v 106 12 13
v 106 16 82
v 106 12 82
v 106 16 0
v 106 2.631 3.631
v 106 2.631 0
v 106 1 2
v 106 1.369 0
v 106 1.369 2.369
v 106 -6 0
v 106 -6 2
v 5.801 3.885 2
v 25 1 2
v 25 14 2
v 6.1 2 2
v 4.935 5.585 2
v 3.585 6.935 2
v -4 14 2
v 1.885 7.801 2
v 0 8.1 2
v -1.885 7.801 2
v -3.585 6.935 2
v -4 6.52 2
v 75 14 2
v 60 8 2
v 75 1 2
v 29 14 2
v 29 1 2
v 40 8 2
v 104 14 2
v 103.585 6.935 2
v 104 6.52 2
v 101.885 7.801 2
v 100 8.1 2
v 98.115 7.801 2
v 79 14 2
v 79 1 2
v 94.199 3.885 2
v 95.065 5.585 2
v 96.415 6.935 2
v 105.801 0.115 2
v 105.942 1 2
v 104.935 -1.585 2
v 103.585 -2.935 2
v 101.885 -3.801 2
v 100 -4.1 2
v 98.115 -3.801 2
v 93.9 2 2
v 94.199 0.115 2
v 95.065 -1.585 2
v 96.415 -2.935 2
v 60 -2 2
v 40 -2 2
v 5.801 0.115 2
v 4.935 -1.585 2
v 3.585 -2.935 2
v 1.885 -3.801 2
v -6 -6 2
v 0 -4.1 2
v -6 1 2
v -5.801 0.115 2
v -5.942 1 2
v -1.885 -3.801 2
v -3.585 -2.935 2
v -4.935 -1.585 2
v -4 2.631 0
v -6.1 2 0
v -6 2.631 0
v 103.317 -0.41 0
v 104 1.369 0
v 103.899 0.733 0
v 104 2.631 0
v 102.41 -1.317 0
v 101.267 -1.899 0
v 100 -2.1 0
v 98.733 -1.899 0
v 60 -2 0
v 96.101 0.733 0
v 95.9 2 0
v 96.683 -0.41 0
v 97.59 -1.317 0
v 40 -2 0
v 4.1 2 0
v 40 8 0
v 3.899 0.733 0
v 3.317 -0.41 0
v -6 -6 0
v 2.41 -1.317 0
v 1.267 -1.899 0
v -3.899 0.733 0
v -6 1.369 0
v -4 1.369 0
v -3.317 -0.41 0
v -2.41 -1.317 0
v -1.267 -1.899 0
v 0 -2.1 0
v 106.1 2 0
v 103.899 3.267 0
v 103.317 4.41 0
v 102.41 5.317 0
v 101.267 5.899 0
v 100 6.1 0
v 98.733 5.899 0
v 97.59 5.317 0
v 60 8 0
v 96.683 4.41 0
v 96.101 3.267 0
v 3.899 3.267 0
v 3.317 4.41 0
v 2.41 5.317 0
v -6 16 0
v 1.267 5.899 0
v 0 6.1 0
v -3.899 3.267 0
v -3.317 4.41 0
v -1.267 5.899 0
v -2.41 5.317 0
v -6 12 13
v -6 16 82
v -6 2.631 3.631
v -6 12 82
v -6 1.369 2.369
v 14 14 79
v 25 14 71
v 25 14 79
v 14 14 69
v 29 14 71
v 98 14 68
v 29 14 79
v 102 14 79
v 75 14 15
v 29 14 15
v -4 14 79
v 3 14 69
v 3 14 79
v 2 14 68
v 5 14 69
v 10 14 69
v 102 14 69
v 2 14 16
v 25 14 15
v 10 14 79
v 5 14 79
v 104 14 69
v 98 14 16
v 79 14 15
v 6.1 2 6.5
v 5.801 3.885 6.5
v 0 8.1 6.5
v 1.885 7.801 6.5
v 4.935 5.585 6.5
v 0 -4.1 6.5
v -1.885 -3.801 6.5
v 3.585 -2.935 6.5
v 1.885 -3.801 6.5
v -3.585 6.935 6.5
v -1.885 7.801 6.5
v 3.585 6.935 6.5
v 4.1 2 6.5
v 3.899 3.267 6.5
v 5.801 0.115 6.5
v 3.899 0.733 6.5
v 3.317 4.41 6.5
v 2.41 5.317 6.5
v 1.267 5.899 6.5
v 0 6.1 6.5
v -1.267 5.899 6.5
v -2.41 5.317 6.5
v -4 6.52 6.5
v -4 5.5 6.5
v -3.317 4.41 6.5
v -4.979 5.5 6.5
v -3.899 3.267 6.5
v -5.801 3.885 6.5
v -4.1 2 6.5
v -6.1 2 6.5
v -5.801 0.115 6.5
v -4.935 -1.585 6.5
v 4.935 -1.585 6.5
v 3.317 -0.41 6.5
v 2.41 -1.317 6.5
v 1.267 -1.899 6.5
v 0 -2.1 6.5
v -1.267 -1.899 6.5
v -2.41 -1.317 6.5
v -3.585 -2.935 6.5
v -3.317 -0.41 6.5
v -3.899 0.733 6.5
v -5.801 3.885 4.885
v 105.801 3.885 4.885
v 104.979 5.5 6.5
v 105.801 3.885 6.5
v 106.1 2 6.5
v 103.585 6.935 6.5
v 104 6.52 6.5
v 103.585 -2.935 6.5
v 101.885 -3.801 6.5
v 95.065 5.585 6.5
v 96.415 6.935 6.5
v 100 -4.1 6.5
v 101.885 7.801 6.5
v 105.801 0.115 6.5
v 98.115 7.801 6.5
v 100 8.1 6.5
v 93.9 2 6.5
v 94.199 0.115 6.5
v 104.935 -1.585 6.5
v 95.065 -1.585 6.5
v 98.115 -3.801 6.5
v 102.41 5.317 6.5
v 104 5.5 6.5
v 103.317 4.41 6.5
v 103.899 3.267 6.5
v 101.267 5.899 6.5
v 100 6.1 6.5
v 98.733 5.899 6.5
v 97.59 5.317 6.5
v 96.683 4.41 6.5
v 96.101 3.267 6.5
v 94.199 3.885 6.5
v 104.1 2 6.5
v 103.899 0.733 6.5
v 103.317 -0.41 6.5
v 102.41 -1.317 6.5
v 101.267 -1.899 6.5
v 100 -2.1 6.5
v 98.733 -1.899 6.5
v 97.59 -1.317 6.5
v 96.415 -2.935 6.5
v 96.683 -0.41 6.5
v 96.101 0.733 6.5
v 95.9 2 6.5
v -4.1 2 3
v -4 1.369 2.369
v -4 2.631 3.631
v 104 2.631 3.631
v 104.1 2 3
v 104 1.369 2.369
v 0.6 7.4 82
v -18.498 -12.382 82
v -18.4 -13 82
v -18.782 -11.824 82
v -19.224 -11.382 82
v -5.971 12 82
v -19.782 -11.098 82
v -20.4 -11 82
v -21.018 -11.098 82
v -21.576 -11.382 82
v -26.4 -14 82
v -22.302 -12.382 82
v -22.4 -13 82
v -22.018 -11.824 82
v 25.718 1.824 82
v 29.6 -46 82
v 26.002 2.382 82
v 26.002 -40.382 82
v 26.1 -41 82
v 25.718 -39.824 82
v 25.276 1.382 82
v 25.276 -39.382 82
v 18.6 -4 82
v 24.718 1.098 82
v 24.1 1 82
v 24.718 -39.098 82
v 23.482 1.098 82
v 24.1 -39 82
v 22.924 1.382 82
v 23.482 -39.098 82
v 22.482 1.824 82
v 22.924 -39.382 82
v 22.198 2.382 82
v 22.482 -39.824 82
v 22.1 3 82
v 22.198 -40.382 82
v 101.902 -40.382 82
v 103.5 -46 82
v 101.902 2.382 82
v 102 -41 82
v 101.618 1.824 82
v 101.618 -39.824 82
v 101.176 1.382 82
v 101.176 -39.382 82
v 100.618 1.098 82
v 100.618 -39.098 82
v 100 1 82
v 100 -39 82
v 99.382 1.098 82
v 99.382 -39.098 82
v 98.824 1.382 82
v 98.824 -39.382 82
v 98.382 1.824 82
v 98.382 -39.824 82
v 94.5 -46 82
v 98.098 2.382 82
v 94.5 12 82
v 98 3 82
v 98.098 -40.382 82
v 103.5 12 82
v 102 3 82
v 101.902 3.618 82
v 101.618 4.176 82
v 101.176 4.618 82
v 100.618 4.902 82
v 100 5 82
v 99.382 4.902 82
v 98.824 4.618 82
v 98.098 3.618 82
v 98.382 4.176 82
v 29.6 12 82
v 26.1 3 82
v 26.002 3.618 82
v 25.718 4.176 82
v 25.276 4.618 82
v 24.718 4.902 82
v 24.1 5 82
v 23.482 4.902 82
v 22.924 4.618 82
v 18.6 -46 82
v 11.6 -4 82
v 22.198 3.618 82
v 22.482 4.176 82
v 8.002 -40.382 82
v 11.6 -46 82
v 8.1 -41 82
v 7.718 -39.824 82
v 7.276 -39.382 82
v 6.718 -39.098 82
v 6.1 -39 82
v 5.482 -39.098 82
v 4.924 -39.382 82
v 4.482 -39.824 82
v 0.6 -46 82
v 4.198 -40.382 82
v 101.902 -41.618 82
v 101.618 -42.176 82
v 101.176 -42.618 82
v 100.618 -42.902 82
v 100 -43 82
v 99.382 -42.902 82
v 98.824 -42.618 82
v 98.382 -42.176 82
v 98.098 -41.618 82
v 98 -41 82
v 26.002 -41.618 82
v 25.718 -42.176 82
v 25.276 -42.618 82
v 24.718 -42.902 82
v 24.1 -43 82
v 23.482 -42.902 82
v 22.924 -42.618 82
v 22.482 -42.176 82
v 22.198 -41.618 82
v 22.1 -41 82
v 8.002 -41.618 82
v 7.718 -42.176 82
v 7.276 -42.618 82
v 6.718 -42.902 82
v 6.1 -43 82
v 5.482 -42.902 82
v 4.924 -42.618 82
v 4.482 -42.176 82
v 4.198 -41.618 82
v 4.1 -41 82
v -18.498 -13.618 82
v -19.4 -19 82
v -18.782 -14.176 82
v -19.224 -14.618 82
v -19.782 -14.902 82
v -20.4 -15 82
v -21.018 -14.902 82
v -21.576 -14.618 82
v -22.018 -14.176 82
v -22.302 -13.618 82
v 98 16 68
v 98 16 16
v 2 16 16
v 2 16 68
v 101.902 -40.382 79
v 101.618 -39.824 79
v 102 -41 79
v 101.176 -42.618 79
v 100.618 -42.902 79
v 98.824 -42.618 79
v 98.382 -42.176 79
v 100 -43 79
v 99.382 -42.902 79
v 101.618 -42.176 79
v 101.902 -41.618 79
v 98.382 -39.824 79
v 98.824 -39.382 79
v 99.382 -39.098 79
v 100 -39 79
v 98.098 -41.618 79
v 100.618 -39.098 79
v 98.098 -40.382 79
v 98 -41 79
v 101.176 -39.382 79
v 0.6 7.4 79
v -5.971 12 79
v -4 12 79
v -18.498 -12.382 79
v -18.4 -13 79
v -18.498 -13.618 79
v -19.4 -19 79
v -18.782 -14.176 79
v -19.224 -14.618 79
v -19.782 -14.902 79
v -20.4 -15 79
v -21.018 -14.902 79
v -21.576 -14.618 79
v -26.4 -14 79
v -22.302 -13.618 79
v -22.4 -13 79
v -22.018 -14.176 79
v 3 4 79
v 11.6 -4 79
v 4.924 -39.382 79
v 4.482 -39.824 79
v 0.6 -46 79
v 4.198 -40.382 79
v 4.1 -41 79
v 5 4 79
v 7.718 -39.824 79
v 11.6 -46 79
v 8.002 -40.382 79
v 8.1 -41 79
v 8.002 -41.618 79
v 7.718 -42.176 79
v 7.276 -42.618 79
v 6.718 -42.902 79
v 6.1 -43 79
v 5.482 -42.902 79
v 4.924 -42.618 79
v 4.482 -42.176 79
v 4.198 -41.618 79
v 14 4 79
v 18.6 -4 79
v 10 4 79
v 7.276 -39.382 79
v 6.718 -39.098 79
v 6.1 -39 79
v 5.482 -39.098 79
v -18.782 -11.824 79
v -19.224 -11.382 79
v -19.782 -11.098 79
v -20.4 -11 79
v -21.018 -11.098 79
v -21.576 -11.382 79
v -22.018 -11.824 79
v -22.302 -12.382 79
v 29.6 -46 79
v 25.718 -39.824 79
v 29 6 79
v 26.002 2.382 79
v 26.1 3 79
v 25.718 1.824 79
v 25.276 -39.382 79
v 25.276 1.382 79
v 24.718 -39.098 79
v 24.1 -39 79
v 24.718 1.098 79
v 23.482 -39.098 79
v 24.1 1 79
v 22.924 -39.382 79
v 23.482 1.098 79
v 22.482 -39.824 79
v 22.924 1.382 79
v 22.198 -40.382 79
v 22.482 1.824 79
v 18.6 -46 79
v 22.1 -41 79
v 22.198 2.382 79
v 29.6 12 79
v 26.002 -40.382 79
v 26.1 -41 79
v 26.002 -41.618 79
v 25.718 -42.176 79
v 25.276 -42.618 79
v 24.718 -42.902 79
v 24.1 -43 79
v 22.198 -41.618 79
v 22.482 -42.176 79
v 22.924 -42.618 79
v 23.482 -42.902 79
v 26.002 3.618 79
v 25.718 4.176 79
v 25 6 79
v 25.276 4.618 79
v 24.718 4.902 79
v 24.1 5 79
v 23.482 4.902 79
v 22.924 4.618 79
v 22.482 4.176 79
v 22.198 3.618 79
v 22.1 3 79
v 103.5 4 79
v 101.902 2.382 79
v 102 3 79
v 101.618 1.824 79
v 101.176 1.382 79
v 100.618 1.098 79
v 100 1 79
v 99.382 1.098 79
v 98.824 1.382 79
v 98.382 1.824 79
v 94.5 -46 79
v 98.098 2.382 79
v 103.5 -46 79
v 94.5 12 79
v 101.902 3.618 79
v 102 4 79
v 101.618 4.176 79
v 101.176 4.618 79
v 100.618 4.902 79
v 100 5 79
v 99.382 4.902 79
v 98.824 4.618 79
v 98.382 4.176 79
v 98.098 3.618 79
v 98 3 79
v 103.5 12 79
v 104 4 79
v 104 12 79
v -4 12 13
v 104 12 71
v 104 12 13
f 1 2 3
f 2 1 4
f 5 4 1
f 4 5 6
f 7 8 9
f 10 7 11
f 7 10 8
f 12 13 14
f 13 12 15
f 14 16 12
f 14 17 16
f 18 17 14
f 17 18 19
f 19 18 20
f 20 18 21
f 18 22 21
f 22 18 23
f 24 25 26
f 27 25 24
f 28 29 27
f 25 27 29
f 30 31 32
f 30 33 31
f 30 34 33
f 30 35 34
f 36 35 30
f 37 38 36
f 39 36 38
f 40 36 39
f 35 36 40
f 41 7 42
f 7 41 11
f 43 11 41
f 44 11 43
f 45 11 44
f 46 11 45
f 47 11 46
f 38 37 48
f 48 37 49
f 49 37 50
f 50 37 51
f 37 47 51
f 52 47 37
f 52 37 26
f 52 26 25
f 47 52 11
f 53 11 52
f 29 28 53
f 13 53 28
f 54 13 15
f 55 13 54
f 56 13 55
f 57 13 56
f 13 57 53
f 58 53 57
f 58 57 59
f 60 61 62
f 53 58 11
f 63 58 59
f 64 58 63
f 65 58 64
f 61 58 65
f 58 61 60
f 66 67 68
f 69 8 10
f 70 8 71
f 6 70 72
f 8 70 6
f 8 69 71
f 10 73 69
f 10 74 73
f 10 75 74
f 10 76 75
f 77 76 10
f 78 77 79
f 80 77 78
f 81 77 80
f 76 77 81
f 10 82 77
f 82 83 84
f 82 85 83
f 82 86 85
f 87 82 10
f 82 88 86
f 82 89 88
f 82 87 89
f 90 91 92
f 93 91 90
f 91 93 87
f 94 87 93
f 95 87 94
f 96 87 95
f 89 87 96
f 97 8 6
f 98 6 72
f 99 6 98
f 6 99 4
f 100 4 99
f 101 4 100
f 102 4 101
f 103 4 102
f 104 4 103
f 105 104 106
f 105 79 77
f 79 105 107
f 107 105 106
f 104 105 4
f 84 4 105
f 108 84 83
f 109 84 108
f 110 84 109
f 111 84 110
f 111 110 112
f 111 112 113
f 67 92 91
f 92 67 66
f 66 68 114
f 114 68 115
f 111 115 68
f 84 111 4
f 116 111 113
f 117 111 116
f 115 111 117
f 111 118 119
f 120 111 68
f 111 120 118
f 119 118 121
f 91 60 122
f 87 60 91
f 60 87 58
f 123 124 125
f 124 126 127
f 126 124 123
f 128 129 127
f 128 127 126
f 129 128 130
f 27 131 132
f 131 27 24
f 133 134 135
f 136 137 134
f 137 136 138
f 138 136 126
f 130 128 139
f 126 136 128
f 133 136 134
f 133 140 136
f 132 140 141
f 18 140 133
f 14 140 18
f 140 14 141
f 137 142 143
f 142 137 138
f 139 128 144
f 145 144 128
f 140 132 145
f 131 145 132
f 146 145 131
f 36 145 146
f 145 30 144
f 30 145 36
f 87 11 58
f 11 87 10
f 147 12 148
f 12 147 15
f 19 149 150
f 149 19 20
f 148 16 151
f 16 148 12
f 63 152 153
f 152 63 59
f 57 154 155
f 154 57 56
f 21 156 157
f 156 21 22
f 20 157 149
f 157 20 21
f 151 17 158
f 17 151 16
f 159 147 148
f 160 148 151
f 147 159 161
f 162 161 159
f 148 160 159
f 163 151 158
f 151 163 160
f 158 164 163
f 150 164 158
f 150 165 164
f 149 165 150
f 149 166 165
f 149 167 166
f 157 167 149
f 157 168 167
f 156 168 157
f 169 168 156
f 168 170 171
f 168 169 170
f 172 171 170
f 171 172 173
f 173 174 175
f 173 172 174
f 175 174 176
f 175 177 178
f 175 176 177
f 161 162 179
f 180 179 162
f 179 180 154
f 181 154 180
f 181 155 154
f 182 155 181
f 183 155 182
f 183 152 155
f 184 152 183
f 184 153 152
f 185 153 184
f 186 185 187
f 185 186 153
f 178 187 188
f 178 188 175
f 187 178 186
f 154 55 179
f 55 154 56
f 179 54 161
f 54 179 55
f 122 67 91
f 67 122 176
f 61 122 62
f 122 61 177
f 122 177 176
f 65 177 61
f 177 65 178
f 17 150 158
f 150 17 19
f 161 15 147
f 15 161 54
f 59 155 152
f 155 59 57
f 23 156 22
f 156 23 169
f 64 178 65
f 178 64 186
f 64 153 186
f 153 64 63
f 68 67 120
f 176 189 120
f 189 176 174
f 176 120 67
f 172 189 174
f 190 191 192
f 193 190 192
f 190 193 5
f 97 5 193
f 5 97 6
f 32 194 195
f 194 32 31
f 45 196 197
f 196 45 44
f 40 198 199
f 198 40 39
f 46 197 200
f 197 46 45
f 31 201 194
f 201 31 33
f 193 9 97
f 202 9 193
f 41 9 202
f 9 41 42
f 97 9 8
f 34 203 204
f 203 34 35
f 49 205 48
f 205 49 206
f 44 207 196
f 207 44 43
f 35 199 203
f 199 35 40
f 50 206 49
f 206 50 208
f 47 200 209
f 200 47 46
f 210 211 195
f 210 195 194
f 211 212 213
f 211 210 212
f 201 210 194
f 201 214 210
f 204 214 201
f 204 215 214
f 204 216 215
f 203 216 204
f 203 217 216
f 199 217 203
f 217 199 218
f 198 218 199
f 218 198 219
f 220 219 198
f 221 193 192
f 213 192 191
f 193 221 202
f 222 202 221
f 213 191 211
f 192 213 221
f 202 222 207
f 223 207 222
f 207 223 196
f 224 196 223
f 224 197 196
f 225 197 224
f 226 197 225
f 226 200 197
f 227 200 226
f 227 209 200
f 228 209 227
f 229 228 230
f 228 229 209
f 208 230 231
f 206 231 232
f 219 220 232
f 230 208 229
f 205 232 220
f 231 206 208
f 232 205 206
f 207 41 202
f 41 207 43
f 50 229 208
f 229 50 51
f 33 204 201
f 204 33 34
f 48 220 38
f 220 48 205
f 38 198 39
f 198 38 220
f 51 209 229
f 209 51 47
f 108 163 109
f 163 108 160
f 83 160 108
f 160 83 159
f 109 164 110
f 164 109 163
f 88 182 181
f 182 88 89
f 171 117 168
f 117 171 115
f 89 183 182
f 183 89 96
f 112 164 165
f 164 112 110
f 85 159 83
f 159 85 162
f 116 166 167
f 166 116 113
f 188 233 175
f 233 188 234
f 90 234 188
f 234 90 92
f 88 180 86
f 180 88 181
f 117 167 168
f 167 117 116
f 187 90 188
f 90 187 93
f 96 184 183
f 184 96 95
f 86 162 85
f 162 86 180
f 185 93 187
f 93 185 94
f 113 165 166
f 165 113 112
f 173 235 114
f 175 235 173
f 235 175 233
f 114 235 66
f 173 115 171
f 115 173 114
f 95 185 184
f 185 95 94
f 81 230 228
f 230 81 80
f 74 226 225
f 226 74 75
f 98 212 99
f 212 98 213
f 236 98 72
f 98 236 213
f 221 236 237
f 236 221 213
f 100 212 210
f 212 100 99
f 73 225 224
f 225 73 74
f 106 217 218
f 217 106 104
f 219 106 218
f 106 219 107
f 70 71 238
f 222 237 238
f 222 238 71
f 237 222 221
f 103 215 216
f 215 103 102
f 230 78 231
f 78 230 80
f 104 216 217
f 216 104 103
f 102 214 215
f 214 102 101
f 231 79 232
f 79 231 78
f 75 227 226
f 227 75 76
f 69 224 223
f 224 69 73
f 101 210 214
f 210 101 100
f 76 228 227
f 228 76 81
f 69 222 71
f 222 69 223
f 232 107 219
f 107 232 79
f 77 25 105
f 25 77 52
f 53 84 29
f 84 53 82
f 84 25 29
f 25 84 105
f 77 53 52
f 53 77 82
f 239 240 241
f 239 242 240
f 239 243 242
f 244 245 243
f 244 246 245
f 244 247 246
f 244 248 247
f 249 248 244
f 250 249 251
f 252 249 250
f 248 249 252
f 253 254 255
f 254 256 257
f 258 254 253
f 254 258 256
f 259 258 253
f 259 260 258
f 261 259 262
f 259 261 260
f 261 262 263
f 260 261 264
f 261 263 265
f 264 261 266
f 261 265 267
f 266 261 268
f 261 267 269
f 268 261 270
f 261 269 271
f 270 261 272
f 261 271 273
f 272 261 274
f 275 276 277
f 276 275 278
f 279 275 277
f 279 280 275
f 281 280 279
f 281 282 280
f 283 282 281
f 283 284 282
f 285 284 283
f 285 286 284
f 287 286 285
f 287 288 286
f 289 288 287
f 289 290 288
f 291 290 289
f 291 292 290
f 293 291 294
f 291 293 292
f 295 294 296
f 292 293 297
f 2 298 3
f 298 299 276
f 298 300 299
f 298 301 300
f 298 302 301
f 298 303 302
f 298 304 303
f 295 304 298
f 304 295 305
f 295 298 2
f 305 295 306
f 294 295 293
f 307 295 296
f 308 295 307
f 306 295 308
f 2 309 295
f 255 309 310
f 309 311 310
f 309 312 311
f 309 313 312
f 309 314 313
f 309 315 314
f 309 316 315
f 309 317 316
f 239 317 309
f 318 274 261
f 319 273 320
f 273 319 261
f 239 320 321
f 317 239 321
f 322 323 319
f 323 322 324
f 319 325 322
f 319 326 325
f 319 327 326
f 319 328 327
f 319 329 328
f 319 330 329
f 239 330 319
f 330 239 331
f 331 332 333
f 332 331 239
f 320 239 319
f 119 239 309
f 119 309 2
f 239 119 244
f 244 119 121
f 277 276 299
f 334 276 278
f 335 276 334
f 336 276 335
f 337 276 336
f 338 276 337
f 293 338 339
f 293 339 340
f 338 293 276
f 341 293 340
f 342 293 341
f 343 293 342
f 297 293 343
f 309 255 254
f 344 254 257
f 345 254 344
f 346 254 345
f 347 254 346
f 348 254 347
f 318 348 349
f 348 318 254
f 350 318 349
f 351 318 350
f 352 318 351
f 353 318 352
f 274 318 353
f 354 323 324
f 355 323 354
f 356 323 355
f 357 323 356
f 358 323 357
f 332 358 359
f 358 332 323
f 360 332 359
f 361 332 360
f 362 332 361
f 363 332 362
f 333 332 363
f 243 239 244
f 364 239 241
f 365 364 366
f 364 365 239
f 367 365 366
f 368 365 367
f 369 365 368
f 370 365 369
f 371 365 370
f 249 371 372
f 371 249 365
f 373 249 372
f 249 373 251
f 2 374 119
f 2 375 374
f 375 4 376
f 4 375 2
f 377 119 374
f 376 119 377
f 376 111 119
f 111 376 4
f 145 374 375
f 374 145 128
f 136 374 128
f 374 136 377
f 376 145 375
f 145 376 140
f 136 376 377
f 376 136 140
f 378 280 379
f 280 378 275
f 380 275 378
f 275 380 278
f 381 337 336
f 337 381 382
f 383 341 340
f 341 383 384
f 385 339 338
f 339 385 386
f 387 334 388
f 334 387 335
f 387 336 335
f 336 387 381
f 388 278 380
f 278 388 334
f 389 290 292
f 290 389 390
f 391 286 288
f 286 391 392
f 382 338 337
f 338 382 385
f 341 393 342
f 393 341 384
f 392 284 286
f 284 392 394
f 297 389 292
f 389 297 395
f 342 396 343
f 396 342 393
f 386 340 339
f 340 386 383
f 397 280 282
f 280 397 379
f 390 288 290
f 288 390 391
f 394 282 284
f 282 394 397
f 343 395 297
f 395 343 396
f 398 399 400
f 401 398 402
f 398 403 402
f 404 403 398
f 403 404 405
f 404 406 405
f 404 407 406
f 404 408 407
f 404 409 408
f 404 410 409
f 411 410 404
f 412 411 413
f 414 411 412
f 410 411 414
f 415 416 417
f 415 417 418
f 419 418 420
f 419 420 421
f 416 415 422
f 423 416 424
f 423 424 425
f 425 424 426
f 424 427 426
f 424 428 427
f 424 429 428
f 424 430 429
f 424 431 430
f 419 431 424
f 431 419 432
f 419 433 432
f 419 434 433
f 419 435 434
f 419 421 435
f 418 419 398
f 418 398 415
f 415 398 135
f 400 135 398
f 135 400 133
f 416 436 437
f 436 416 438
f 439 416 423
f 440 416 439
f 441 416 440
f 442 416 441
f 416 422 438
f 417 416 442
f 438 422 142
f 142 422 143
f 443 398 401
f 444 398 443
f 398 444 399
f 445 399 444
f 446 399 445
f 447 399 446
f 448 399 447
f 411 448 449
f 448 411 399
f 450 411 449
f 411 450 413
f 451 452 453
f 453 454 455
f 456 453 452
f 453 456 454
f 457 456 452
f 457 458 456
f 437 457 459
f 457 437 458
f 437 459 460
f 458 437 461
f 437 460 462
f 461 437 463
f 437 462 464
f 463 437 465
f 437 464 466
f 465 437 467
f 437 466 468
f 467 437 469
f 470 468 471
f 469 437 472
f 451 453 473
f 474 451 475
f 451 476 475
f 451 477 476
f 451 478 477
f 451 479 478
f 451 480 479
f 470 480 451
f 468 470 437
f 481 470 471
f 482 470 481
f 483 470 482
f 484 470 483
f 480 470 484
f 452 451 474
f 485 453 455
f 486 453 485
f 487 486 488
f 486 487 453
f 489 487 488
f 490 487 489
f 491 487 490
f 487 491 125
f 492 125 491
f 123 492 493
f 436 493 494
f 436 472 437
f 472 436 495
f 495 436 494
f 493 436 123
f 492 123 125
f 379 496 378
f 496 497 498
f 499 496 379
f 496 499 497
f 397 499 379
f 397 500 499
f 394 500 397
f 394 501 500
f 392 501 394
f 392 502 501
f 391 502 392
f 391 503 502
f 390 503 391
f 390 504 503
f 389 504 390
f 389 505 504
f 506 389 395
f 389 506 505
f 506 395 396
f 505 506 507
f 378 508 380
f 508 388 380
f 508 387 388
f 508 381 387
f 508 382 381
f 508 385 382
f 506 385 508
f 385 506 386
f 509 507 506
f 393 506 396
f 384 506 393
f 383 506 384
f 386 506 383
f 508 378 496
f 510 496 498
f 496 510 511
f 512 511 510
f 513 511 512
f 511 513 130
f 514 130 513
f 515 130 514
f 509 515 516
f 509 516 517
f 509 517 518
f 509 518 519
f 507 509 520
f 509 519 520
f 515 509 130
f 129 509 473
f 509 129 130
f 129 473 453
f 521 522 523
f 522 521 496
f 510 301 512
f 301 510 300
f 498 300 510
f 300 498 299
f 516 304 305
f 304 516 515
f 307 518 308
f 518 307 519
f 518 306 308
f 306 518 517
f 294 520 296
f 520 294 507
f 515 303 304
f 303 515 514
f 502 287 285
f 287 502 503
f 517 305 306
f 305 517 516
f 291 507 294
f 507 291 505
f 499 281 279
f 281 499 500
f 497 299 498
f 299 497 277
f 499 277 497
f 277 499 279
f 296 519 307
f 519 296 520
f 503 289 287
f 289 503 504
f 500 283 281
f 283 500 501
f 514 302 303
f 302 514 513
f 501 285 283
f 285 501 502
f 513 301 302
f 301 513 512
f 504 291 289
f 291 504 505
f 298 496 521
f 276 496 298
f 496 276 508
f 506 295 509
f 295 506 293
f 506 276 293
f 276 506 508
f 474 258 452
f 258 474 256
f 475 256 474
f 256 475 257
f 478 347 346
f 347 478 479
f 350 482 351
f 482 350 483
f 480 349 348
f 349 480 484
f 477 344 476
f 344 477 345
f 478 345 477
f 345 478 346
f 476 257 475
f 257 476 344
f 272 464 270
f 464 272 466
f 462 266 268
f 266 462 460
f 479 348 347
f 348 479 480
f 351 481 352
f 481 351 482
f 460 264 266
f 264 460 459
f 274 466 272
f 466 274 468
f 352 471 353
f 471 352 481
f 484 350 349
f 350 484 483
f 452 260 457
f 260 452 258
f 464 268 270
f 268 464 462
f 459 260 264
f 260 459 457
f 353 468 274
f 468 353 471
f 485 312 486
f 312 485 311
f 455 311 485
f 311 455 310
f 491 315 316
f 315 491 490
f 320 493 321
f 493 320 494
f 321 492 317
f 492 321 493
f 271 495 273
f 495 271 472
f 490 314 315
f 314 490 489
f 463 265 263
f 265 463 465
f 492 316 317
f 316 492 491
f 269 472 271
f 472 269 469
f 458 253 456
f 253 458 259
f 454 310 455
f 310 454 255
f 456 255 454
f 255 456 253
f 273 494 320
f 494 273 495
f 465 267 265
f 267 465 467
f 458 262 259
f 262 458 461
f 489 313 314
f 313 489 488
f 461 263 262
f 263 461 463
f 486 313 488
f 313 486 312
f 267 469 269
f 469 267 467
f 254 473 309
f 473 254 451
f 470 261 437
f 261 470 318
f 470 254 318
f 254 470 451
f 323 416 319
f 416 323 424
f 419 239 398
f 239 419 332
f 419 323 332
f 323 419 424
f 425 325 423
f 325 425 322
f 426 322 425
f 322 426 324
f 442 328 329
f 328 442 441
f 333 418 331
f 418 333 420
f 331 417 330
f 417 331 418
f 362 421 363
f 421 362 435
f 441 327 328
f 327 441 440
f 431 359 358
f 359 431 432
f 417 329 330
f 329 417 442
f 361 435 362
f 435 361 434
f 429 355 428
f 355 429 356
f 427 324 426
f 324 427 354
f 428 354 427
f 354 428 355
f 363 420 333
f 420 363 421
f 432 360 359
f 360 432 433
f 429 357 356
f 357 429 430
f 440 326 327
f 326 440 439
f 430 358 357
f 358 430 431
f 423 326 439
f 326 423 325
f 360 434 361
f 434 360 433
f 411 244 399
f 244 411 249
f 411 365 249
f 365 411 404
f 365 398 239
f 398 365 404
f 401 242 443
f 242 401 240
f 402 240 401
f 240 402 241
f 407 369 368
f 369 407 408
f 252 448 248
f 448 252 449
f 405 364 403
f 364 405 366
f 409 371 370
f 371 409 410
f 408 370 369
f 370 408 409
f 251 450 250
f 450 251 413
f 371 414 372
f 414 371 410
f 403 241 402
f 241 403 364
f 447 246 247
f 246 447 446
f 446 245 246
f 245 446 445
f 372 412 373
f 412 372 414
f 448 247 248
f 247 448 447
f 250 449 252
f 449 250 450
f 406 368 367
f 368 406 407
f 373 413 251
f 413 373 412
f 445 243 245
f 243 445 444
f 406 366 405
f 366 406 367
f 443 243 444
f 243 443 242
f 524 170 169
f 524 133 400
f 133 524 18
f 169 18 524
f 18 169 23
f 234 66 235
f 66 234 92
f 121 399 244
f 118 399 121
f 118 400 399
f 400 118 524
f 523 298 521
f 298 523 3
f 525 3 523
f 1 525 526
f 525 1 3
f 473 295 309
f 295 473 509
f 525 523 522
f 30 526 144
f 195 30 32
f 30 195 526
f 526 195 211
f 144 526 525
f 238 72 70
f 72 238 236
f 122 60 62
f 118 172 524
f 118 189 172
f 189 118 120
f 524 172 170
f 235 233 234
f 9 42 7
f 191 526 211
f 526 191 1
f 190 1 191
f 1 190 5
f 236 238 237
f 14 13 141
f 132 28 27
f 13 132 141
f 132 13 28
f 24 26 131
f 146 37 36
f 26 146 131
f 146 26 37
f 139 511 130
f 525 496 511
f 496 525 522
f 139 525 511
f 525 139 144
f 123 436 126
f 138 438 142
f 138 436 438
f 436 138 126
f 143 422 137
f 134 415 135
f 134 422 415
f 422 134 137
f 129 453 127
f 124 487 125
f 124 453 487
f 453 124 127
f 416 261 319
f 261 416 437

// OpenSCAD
//translate([-5,2,5])
//rotate([90,0,0])
//scale([1.06,1.06,1.06])
//import("din_rail_mount.stl");
$fn=20;
//lcd
lcd_hole_pitch_w = 75.9;
lcd_hole_pitch_l = 44;


mount_hole_w = 100;
mount_hole_d = 8.2;

rfid_hole_w = 42;
rfid_hole_d = 4;

mount_h = 2;
mount_l = 20;


full_h = 46 + 47; //box depth + lid depth
lcd_h = 5;
lcd_mount_h = 6; //6mm stand off (8mm for rdif as thinner)
arm_t = 3; //thickness of arms holding lcd and rfif
arm_l = 11;

stand_off_h = full_h - lcd_h - lcd_mount_h; //how tall it needs to be
stand_off_hp = full_h - lcd_h - lcd_mount_h-arm_t; //base of arm hieght


//basemountframe
difference(){
    union(){
        translate([-6,-6,0])
            cube([mount_hole_w+12,mount_l,mount_h]);
        translate([0,2,0])
        cylinder(h=6.5, d =mount_hole_d+4);
        
        translate([mount_hole_w,2,0])
            cylinder(h=6.5, d =mount_hole_d+4);
        
    }
    translate([0,2,0])
    cylinder(h=6.5, d =mount_hole_d);
    translate([mount_hole_w,2,0])
        cylinder(h=6.5, d =mount_hole_d);
    translate([mount_hole_w/2-10,-2,0])
        cube([20,10,mount_h]);   //screw mount is in the way
}

//upright bit
translate([-6,14,0])
difference(){
    cube([mount_hole_w+12,2,stand_off_h]);
    translate([8,0,16])
    cube([mount_hole_w-4,2,stand_off_h-30]);
}
//support
translate([-6,12,0])
cube([2,2,stand_off_h]);
translate([mount_hole_w +6-2,12,0])
cube([2,2,stand_off_h]);
#translate([-6,12,stand_off_hp])
cube([mount_hole_w+12,2,3]);


//arms to hold lcd and rfid
//rightmost arm
color("blue")
translate([mount_hole_w-arm_l/2,14-60,stand_off_hp])
difference(){
    cube([arm_l-2,60,arm_t]);
    translate([0,5,0]){
        translate([arm_l/2,0,0])
            #cylinder(h=6, d =rfid_hole_d);
        translate([arm_l/2,lcd_hole_pitch_l,0])
            #cylinder(h=6, d =rfid_hole_d);
    }
}
//left arm for lcd
color("blue")
translate([mount_hole_w-arm_l/2-lcd_hole_pitch_w,14-60,stand_off_hp])
difference(){
    cube([arm_l,60,arm_t]);
    translate([0,5,0]){
        translate([arm_l/2,0,0])
            #cylinder(h=6, d =rfid_hole_d);
        translate([arm_l/2,lcd_hole_pitch_l,0])
            #cylinder(h=6, d =rfid_hole_d);
    }
}

//rfid right arm
color("blue")
translate([mount_hole_w-arm_l/2-lcd_hole_pitch_w-18,14-60,stand_off_hp])
difference(){
    cube([arm_l,60,arm_t]);
    translate([0,5,0]){
        translate([arm_l/2,0,0])
            #cylinder(h=6, d =rfid_hole_d);
    }
}

//rfid left arm
color("blue")
translate([mount_hole_w-arm_l/2-lcd_hole_pitch_w-18-25+4,14,stand_off_hp])
difference(){
    translate([26,0,0])
    rotate([0,0,180])
    linear_extrude(arm_t)
    polygon([[0,0],[25,33],[32,28],[10,0]]);
    
    #translate([0,-(60-2-31),0])
        cylinder(h=6, d =rfid_hole_d);
    
    
}

module angle_supp(siz=5, wid=2) {
    rotate([0,-90,180])
    linear_extrude(wid)
    polygon([[0,0],[siz,0],[0,siz]]);
    
}
//supports
translate([-6,14,0])
angle_supp(15);

translate([mount_hole_w+4,14,0])
angle_supp(15);

translate([25,14,0])
angle_supp(15, 4);

translate([75,14,0])
angle_supp(15, 4);

translate([mount_hole_w+4,14,stand_off_hp])
rotate([0,180,0])
angle_supp(10);

translate([14,14,stand_off_hp])
rotate([0,180,0])
angle_supp(10,4);

translate([5,14,stand_off_hp])
rotate([0,180,0])
angle_supp(10,2);

translate([29,14,stand_off_hp])
rotate([0,180,0])
angle_supp(8,4);

translate([10,-4,stand_off_hp])
cube([10,20,arm_t]);
